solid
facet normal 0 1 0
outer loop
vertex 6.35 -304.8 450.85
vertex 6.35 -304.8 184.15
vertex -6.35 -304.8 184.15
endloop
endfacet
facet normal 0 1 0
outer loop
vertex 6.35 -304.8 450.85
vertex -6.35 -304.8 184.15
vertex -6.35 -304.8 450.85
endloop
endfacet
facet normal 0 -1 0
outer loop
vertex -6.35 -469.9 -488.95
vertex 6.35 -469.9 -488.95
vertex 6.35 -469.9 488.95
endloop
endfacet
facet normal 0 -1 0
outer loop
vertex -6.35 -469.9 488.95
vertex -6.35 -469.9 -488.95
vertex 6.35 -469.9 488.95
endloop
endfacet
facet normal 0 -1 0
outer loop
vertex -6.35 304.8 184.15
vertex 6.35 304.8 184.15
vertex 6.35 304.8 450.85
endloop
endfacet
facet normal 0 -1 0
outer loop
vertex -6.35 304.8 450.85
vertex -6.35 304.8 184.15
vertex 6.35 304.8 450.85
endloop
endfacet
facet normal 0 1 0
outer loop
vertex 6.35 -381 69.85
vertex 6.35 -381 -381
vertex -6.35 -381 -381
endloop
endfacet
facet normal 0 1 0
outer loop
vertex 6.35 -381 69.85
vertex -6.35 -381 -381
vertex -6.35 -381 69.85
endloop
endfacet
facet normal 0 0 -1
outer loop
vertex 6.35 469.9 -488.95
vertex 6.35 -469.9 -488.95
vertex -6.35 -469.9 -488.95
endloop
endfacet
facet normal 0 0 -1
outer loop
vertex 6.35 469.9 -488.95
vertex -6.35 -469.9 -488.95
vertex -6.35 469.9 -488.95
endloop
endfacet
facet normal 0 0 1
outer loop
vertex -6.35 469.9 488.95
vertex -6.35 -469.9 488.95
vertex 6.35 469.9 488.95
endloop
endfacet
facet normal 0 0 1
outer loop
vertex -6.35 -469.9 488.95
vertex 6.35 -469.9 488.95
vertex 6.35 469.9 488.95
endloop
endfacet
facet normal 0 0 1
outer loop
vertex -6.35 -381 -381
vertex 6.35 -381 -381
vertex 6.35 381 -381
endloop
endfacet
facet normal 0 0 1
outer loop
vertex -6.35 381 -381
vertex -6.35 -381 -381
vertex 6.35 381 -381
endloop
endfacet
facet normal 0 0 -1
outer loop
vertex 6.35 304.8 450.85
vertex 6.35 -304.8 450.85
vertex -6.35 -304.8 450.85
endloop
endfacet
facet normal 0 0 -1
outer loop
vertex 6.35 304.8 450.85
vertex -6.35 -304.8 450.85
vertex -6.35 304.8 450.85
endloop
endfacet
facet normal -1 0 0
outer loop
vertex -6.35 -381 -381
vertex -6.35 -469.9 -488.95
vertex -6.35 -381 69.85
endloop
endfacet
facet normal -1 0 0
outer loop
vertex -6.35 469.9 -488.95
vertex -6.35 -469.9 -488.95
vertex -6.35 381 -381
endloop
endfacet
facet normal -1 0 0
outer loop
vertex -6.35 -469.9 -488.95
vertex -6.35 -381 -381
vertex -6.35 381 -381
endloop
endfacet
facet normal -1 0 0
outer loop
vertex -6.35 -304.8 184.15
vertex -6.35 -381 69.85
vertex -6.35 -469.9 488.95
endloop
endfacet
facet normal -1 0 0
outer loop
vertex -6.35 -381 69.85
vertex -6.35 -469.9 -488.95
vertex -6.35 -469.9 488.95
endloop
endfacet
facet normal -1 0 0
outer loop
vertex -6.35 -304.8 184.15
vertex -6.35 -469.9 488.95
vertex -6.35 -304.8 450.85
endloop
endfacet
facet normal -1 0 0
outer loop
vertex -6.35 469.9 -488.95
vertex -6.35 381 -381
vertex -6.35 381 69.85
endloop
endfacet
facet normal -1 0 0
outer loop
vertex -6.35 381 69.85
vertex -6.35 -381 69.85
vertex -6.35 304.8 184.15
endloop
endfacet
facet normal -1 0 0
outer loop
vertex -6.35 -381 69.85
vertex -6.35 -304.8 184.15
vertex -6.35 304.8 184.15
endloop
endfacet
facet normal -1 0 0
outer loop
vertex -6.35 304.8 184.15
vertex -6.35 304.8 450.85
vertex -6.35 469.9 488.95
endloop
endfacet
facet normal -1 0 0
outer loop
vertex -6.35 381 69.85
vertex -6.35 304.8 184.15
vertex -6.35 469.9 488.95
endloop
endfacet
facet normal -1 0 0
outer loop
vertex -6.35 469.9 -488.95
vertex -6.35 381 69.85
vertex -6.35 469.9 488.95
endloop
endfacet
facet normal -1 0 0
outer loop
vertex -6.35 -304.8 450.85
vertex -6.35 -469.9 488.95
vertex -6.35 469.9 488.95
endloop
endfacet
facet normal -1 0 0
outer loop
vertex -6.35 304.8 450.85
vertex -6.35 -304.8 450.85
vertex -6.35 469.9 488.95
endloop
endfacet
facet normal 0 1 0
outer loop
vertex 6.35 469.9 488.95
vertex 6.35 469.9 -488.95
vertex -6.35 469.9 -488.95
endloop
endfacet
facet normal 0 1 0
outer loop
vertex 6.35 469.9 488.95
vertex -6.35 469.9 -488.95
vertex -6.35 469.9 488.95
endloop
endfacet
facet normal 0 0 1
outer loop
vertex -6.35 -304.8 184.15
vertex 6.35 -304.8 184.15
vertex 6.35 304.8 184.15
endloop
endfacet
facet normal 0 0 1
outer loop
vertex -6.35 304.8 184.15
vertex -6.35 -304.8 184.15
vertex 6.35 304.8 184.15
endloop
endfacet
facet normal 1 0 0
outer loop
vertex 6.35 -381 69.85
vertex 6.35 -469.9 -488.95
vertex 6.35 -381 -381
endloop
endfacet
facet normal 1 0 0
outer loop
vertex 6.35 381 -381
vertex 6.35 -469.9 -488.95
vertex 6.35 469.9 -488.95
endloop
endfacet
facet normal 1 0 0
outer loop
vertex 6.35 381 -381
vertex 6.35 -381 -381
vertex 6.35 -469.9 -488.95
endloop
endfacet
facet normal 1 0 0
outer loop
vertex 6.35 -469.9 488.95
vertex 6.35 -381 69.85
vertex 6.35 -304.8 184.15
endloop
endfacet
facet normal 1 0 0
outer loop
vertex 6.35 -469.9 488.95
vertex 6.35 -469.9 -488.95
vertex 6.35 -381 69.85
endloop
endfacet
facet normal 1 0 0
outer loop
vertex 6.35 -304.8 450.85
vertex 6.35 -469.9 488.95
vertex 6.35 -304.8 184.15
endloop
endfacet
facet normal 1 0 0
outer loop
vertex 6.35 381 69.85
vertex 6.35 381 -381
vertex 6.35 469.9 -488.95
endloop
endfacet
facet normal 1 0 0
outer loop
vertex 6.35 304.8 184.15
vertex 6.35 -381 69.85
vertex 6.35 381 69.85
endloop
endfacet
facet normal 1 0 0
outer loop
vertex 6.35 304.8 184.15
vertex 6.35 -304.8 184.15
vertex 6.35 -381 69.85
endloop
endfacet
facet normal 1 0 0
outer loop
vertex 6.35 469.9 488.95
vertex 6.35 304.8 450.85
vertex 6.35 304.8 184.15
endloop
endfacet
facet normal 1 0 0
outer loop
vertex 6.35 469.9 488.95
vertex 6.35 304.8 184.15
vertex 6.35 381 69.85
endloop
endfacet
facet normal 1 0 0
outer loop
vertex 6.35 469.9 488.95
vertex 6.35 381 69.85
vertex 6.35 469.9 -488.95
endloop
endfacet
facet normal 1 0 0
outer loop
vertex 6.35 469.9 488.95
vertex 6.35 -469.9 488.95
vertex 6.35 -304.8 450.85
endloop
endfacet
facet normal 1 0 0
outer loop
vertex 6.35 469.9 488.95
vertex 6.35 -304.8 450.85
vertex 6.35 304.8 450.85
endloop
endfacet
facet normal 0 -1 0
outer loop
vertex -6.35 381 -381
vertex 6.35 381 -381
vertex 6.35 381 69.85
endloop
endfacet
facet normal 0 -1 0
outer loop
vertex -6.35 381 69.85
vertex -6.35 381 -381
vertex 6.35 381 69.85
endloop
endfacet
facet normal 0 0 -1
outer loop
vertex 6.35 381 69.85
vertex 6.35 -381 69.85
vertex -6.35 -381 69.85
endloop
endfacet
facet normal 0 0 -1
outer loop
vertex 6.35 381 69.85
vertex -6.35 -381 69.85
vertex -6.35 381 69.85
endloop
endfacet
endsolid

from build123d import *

# Parameters (mm, degrees)
F0_W     = 939.8
F0_H     = 977.9
F1_DEPTH = 6.35
F2_W     = 762
F2_H     = 450.85
F2_W_2   = 609.6
F2_H_2   = 266.7
F3_DEPTH = 12.701


with BuildPart() as f1:
    # F0 (on Right) → F1 (new body, symmetric)
    with BuildSketch(Plane.YZ):
        Rectangle(F0_W, F0_H)
    extrude(amount=F1_DEPTH, both=True)

    # F2 (on face) → F3 (cut, through all)
    with BuildSketch(Plane.YZ.offset(6.35)):
        with Locations((0, -155.575)):
            Rectangle(F2_W, F2_H)
        with Locations((0, 317.5)):
            Rectangle(F2_W_2, F2_H_2)
    extrude(amount=-F3_DEPTH, mode=Mode.SUBTRACT)


solid = f1.part
